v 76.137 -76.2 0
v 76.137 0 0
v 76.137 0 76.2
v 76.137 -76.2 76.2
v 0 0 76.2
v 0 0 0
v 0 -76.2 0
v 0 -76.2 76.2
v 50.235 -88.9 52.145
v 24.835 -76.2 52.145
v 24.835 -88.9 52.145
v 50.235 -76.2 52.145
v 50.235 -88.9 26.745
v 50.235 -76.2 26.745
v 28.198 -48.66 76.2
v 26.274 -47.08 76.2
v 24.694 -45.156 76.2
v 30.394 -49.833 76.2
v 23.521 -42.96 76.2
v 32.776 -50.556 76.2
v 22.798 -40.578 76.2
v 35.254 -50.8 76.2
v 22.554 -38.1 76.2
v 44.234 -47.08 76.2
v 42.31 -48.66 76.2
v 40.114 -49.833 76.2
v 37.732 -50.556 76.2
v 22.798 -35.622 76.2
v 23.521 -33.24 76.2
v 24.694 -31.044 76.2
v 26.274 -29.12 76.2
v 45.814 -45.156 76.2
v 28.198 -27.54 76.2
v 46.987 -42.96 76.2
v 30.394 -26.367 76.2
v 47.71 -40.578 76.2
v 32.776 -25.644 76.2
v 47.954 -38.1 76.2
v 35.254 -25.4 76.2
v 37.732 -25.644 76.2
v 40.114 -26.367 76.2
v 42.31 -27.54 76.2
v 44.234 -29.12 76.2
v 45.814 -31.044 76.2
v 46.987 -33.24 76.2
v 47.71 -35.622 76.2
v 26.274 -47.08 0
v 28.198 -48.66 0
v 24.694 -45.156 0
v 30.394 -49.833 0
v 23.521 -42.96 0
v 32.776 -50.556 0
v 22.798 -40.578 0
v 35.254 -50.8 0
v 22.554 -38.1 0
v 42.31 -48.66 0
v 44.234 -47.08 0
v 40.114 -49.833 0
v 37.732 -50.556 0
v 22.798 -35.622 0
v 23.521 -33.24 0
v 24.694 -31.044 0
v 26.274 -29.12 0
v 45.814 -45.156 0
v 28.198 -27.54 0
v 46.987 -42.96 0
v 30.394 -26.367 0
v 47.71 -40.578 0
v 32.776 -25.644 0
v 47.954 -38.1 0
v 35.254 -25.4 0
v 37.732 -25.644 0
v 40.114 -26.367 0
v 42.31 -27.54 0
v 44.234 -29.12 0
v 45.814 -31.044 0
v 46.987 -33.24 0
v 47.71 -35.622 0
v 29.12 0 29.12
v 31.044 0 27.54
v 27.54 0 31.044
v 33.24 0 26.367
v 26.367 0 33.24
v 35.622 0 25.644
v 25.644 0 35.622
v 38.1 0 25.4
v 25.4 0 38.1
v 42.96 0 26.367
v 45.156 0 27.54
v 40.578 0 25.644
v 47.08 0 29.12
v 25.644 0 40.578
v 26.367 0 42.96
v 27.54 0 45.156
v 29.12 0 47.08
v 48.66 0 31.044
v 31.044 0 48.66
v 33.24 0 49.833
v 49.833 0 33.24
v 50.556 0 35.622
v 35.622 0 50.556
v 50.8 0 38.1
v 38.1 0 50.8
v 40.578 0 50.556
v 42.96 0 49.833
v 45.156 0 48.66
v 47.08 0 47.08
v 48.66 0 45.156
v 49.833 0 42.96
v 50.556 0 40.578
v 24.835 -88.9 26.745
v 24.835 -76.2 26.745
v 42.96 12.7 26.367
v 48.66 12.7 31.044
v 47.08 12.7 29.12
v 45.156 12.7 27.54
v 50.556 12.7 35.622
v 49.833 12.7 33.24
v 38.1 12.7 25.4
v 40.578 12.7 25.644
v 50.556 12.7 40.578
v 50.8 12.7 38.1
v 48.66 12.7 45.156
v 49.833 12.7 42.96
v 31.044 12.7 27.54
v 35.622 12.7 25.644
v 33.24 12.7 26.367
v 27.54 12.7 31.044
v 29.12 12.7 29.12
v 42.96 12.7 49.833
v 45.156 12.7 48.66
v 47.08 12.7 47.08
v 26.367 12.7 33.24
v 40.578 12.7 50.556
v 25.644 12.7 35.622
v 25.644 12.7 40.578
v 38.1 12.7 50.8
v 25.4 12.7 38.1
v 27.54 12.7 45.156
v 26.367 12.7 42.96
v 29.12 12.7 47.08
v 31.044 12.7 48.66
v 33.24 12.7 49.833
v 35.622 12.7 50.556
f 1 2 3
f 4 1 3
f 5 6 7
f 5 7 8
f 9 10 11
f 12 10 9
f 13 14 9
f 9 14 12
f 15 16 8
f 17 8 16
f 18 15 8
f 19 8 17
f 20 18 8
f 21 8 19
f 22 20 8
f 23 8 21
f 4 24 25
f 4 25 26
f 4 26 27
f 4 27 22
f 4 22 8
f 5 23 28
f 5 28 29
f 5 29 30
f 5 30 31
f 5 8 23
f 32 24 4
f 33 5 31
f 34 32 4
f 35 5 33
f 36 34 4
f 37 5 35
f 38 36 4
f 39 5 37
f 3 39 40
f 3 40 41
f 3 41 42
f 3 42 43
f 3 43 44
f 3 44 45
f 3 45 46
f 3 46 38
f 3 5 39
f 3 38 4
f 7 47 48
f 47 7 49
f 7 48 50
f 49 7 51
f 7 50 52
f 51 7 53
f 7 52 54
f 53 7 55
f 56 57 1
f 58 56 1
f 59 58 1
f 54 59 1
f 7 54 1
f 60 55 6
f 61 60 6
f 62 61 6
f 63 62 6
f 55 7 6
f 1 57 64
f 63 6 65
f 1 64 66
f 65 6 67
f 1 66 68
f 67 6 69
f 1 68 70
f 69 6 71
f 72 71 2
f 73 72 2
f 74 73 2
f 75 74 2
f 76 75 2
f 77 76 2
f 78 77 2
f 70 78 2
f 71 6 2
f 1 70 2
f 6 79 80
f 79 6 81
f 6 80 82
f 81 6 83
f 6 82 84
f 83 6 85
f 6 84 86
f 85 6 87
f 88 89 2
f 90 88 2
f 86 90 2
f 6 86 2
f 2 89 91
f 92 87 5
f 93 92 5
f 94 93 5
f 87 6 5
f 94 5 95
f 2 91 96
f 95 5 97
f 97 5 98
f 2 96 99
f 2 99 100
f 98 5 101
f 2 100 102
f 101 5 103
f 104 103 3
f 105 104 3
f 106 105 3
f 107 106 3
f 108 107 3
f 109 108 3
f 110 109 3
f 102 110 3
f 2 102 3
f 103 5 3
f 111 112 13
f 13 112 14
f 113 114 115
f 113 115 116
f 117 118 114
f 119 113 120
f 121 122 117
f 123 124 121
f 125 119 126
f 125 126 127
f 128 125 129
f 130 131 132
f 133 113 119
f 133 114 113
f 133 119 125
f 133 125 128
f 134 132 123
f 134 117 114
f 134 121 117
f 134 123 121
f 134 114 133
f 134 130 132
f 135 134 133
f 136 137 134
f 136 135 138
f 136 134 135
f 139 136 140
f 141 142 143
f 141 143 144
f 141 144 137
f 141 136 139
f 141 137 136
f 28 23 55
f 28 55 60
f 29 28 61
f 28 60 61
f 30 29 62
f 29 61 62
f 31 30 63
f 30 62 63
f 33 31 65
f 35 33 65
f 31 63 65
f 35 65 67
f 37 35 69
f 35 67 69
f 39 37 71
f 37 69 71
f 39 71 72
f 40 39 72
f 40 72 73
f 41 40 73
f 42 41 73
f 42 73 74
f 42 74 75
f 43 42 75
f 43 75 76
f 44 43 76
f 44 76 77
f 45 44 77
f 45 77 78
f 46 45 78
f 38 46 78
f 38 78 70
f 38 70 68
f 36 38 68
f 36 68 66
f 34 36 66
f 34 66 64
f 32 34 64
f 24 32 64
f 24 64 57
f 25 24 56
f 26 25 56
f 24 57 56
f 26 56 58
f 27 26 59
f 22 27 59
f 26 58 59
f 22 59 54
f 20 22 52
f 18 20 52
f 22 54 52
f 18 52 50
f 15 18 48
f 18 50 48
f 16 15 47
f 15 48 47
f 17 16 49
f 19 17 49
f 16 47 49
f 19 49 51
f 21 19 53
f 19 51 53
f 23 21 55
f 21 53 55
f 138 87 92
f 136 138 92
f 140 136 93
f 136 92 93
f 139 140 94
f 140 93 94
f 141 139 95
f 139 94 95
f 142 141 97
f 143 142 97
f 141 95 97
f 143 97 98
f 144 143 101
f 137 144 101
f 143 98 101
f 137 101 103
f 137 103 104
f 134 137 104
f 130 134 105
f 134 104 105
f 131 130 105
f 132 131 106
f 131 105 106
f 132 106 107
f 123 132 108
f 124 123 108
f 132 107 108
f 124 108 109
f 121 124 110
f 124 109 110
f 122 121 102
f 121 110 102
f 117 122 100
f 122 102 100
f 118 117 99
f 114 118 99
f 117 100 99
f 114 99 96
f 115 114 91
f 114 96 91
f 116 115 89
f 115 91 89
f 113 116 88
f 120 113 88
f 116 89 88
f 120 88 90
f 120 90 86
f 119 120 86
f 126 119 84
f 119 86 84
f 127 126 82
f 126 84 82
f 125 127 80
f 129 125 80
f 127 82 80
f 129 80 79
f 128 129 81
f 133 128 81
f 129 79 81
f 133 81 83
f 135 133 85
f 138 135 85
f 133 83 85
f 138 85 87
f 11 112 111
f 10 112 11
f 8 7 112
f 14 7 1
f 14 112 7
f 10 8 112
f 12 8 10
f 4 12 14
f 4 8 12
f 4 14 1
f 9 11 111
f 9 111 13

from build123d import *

# Parameters (mm, degrees)
F0_W     = 76.137118
F0_H     = 76.2
F1_DEPTH = 76.2
F4_D     = 25.4
F2_W     = 25.4
F2_H     = 25.4
F5_DEPTH = 12.7
F6_R     = 12.7
F7_DEPTH = 12.7


with BuildPart() as f1:
    # F0 (on Front) → F1 (new body)
    with BuildSketch(Plane.XZ):
        with Locations((38.068559, 38.1)):
            Rectangle(F0_W, F0_H)
    extrude(amount=F1_DEPTH)

    # F4 (through all)
    with Locations(Plane.XY.offset(76.2)):
        with Locations((35.253923, -38.1)):
            Hole(F4_D / 2)

    # F2 (on face) → F5 (join)
    with BuildSketch(Plane.XZ.offset(76.2)):
        with Locations((37.534562, 39.444917)):
            Rectangle(F2_W, F2_H)
    extrude(amount=F5_DEPTH)

    # F6 (on face) → F7 (join)
    with BuildSketch(Plane(origin=(0, 0, 0), x_dir=(-1, 0, 0), z_dir=(0, 1, 0))):
        with Locations((-38.1, 38.1)):
            Circle(F6_R)
    extrude(amount=F7_DEPTH)


solid = f1.part
